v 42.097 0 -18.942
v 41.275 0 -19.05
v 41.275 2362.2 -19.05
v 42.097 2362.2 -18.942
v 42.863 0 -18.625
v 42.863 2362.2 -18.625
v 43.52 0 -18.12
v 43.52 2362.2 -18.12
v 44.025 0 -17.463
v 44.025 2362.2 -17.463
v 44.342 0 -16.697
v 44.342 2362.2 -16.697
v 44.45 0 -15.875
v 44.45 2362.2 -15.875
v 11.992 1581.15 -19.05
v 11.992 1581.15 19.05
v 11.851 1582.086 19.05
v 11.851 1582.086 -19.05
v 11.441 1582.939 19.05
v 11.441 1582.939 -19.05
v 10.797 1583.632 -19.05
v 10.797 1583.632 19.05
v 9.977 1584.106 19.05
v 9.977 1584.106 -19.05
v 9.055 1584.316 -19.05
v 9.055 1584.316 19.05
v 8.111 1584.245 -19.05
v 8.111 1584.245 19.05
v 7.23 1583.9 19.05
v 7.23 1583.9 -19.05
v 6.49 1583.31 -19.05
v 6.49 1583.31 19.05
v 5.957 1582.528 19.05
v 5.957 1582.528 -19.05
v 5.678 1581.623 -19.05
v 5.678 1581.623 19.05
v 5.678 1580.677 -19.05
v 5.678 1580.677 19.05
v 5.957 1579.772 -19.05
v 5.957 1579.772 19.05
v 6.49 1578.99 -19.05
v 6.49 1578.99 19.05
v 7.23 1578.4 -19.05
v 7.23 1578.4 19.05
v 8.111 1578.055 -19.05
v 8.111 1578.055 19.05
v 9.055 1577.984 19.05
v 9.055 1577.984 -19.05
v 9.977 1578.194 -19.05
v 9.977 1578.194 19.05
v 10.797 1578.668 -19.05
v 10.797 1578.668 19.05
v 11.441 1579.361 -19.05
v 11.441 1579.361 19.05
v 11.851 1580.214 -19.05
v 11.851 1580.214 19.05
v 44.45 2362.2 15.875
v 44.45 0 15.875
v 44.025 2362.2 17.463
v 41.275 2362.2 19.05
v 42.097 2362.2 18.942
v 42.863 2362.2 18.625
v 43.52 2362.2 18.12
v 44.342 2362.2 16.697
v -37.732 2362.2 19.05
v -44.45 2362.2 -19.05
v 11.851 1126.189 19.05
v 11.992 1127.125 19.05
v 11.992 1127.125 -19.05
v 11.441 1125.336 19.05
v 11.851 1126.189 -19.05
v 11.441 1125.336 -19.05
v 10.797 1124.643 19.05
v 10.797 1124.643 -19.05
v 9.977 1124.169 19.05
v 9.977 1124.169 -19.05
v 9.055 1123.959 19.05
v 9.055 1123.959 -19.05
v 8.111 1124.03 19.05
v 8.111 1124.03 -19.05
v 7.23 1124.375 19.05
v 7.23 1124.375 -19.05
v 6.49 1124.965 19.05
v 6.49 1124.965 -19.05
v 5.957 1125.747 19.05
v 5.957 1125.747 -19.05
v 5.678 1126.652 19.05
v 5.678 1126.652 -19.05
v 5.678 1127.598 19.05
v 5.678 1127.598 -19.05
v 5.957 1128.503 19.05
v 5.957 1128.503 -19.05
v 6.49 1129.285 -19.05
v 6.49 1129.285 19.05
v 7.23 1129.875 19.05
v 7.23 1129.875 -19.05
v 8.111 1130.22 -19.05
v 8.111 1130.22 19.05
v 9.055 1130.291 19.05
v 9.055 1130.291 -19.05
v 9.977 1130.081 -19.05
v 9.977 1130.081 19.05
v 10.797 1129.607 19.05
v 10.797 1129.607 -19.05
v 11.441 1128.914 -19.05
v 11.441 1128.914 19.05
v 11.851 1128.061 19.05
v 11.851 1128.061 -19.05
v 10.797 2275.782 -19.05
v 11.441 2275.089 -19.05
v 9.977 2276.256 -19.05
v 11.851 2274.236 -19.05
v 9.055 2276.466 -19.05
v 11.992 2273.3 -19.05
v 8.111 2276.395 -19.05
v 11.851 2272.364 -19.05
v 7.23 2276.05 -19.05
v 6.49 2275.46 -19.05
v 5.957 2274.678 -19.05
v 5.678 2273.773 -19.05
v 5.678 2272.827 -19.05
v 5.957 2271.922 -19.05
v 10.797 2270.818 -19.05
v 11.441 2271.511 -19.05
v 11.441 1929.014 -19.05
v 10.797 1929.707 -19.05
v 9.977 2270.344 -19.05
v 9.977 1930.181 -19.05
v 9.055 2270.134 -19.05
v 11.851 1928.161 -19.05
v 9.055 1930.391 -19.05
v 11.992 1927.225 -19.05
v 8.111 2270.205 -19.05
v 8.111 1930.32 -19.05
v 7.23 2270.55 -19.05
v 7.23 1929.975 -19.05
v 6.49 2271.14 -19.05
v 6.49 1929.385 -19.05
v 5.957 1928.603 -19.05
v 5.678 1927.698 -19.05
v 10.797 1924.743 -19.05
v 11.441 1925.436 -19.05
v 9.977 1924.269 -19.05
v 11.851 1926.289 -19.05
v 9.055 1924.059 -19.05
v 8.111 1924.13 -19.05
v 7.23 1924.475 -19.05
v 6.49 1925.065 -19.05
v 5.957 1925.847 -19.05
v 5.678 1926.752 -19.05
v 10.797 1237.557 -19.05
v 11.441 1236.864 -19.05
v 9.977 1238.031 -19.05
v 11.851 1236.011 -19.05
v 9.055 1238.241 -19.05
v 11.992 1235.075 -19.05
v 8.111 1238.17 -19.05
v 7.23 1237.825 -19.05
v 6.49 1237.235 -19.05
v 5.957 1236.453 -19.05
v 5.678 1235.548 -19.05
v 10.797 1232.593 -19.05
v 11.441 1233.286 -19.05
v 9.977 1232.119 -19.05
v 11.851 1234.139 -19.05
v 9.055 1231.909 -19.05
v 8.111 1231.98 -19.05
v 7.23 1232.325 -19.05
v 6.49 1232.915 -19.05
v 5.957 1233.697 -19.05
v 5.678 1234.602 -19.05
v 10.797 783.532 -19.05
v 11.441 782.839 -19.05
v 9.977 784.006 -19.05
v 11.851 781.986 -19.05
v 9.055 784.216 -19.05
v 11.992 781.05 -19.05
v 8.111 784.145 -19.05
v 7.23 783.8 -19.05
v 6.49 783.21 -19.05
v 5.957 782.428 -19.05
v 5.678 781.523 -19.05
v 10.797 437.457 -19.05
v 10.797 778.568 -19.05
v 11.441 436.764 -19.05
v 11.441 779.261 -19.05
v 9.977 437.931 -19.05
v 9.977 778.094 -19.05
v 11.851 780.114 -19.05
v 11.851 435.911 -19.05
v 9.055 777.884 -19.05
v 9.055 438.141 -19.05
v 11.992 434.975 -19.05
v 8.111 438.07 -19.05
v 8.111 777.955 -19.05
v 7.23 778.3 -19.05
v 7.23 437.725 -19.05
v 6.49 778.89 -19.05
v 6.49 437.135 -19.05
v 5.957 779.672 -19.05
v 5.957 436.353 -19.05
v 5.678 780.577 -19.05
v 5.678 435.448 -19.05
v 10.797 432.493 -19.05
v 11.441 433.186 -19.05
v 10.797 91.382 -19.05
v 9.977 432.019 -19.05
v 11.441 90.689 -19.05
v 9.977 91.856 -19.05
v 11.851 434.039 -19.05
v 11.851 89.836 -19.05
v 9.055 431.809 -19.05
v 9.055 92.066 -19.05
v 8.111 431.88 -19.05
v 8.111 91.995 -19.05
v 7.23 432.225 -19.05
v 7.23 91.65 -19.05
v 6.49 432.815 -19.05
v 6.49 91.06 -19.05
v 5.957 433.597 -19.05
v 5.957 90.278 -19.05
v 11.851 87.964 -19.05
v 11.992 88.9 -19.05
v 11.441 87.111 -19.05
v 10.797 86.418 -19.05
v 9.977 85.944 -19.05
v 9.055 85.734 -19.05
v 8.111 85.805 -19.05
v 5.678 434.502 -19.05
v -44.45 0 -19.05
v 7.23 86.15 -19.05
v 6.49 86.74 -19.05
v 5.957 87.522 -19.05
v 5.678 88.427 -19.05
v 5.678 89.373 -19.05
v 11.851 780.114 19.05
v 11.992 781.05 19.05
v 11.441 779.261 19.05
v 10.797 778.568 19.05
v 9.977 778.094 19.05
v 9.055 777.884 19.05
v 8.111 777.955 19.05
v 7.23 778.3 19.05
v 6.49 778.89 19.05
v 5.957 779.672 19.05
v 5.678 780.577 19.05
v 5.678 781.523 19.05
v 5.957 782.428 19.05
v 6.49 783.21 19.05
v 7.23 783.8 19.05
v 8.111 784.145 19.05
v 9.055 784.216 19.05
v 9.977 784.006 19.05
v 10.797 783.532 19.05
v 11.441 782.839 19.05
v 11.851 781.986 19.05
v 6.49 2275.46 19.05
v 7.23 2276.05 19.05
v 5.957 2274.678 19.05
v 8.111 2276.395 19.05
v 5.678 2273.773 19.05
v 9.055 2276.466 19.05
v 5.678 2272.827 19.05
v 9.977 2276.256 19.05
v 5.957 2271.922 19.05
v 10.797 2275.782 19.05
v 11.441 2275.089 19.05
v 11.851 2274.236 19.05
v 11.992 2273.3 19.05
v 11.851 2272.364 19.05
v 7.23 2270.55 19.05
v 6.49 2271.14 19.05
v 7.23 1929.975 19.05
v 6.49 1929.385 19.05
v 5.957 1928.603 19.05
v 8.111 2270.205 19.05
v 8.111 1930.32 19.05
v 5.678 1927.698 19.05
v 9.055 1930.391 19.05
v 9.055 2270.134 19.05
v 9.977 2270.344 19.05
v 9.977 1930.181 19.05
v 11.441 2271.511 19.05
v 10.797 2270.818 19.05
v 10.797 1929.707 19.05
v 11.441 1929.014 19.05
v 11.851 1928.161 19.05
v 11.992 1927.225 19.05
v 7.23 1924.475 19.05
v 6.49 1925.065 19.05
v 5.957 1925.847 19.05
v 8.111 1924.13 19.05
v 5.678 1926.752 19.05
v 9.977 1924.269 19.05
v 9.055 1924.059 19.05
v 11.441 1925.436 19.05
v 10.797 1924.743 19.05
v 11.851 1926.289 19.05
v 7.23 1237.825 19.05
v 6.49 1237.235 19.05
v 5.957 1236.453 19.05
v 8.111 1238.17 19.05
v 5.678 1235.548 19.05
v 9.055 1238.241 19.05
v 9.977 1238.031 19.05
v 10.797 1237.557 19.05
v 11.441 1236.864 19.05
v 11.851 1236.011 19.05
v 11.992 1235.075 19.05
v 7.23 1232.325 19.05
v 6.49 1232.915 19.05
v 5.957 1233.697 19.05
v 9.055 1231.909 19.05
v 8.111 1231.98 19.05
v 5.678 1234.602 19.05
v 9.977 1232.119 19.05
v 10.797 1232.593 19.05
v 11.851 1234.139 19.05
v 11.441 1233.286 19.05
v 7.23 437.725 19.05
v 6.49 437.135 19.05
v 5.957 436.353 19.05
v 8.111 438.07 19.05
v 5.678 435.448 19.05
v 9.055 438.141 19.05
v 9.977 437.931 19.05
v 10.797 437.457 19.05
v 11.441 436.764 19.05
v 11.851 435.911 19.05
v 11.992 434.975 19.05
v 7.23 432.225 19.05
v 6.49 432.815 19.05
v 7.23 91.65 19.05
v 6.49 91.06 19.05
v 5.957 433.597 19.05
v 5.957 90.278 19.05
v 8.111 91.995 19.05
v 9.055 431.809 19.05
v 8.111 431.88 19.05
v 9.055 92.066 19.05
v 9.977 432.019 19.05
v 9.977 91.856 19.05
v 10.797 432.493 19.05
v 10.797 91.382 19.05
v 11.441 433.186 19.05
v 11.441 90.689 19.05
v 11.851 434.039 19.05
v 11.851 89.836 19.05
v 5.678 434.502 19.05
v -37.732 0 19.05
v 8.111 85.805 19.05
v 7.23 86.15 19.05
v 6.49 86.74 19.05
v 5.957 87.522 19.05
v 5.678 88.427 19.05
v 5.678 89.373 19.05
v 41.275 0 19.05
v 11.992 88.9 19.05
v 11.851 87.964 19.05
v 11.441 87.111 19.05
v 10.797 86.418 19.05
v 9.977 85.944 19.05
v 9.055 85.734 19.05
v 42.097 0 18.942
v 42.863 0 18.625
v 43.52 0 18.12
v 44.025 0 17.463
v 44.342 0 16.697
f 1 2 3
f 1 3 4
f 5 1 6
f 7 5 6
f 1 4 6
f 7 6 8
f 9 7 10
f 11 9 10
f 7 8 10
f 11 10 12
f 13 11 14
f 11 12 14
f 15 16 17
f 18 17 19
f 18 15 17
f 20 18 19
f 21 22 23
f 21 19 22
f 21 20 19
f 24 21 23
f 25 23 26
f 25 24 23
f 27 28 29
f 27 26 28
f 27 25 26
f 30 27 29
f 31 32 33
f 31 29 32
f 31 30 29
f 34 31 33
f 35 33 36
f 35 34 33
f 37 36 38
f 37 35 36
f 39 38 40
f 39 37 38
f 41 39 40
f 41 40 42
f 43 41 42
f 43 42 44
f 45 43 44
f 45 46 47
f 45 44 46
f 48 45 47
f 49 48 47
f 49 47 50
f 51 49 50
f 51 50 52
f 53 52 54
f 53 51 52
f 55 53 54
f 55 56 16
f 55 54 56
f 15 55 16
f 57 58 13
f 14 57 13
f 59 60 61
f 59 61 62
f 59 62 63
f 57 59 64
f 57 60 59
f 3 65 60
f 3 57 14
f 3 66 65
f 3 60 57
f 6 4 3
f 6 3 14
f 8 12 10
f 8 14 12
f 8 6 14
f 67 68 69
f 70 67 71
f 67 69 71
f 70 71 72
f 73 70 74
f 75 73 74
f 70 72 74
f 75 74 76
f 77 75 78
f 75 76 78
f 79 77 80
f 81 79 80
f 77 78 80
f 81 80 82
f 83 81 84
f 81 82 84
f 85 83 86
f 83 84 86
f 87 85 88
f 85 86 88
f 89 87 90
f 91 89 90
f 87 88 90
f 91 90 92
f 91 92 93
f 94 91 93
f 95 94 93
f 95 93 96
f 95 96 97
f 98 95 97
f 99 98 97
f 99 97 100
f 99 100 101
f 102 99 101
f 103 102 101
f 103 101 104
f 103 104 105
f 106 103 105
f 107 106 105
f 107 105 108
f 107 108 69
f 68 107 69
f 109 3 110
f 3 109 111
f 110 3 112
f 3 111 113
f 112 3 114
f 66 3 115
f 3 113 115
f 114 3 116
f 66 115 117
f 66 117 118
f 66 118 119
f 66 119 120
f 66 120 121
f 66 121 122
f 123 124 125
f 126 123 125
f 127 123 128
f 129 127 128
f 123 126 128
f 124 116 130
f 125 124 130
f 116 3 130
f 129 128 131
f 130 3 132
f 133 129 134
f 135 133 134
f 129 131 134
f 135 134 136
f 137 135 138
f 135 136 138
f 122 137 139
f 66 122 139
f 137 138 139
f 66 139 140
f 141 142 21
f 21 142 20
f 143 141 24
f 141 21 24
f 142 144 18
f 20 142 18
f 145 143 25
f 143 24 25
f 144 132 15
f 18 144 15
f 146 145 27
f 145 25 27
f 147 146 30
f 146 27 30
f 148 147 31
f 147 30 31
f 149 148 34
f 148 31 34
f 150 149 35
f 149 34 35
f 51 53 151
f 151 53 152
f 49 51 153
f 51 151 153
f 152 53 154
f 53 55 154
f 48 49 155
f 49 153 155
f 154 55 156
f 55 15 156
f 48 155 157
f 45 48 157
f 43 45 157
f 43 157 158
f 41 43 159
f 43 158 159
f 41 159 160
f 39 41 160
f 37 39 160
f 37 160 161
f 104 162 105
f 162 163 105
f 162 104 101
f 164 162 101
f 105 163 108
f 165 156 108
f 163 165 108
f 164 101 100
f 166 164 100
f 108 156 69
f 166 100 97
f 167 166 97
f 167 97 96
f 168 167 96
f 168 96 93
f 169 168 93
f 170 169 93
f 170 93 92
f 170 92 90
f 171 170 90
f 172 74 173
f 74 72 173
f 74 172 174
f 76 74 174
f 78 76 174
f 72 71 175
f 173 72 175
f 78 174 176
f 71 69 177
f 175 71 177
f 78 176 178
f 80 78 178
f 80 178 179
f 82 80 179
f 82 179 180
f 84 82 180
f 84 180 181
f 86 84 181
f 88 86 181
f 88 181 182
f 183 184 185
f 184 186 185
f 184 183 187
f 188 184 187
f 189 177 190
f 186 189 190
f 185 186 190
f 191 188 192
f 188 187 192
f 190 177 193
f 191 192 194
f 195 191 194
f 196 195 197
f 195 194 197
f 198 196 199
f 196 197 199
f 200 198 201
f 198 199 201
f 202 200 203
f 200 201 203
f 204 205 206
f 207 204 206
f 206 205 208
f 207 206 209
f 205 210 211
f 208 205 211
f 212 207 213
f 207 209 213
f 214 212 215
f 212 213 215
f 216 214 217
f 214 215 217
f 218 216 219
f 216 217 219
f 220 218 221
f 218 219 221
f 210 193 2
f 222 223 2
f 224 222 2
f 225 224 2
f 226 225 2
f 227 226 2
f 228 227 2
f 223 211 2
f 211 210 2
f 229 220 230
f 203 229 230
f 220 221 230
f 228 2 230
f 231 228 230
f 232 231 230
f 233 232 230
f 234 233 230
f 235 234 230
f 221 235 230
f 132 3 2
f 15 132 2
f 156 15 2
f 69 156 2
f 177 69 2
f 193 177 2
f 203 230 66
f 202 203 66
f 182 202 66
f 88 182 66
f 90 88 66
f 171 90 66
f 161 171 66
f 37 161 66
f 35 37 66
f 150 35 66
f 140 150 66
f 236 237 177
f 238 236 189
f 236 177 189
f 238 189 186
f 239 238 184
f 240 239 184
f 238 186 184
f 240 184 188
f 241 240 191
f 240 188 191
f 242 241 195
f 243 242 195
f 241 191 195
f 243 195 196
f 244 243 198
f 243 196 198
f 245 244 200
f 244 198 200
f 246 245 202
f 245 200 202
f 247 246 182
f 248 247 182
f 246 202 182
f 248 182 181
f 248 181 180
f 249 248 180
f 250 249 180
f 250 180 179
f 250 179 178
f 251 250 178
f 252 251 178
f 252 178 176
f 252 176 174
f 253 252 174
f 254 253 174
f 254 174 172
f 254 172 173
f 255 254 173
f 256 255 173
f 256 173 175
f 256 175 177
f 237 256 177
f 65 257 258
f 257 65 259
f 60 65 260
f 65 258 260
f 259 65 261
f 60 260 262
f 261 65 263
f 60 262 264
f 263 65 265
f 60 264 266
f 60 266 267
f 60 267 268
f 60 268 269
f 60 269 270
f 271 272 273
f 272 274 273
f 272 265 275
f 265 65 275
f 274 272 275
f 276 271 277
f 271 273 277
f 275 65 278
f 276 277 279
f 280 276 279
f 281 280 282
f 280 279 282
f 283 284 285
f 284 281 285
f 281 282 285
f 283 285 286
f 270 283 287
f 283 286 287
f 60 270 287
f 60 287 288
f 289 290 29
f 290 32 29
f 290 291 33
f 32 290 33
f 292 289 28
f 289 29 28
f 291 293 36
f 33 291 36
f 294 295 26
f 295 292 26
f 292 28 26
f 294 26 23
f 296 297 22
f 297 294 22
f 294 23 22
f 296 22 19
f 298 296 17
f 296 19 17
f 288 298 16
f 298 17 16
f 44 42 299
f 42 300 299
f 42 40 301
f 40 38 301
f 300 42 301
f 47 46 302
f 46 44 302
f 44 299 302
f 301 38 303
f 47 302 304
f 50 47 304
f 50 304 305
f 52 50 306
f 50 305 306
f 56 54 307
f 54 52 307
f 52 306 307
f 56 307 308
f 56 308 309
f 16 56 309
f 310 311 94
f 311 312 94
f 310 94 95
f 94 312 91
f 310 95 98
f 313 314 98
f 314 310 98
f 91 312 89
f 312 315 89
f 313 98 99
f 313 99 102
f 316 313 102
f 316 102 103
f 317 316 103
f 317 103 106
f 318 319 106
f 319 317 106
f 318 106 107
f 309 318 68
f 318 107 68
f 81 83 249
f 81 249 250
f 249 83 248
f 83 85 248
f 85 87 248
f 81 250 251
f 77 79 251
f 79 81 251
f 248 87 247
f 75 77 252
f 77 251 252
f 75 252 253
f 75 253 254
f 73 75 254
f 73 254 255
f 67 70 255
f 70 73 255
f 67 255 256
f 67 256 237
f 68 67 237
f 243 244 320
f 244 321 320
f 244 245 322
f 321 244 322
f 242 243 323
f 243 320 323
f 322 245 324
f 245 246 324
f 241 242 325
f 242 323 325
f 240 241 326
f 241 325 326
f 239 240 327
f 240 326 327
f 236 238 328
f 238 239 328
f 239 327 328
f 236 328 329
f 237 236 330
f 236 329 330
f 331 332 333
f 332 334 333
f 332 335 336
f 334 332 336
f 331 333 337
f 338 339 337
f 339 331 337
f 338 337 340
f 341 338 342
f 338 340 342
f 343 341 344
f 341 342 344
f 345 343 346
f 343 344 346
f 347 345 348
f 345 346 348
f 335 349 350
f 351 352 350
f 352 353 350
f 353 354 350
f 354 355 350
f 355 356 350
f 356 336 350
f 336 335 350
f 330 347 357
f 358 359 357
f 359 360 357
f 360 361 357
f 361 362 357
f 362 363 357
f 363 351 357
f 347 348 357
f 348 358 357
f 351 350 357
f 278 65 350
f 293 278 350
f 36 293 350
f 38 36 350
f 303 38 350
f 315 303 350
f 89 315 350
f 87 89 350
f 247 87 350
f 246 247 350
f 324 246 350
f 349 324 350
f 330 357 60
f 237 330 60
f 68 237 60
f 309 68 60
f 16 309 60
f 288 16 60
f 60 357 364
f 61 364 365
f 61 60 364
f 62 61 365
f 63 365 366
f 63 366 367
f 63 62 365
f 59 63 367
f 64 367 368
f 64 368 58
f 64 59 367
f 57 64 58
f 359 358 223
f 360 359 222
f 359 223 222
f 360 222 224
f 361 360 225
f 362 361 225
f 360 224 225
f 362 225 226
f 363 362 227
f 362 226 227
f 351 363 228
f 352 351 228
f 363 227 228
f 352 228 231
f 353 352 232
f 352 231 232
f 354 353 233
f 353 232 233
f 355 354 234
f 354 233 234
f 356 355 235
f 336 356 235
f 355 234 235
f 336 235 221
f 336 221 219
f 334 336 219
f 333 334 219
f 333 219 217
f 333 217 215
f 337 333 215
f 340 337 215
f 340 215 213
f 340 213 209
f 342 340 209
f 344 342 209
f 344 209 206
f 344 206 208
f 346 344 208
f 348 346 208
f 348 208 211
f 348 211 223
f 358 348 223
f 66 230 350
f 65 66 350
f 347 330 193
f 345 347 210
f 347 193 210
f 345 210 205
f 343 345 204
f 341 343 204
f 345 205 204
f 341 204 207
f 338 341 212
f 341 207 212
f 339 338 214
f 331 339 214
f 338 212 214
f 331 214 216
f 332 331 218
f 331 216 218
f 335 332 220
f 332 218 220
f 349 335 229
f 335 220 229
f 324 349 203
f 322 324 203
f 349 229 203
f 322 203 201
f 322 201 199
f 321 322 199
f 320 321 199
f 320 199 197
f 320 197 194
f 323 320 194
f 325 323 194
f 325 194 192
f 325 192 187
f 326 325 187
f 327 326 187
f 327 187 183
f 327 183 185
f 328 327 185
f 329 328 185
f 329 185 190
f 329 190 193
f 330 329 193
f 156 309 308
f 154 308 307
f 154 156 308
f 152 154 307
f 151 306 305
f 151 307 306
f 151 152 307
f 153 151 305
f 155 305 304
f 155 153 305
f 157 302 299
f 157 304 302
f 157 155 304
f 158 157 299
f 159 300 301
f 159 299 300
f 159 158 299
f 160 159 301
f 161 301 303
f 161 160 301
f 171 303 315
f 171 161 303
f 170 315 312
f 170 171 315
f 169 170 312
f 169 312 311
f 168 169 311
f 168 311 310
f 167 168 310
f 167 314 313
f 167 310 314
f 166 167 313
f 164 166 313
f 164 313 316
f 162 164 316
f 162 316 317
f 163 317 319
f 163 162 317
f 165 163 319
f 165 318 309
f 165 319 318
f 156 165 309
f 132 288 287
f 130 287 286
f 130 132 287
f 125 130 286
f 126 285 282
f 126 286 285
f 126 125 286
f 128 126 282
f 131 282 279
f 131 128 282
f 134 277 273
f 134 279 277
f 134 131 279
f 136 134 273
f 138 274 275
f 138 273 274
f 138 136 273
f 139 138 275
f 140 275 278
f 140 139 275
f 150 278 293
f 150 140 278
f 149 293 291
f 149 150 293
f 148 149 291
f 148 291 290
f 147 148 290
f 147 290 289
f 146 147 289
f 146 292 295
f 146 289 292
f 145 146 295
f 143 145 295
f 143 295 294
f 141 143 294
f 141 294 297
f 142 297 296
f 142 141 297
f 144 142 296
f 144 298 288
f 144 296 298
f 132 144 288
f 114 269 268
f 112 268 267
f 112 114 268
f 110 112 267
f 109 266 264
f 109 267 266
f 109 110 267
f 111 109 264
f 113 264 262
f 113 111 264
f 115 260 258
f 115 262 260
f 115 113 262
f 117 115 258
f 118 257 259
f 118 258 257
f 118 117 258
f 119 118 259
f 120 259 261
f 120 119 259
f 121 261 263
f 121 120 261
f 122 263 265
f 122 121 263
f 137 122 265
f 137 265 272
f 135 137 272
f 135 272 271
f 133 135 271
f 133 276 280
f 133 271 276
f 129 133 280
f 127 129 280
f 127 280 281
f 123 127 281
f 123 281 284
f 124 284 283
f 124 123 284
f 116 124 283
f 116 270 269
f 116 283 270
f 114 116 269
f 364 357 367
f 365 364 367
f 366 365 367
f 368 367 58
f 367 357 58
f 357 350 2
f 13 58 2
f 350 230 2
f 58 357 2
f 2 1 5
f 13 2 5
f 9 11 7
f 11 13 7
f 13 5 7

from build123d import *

# Parameters (mm, degrees)
BOSS_EXTRUDE1_DEPTH         = 2362.2
F_1_4_0_25_DIAMETER_HOLE1_D = 6.35
FILLET2_R                   = 3.175


with BuildPart() as part:
    # Sketch1 → Boss-Extrude1 (new body)
    with BuildSketch(Plane(origin=(0, 0, 0), x_dir=(1, 0, 0), z_dir=(0, 1, 0))):
        Polygon((-44.45, 19.05), (-37.731942035, -19.05), (44.45, -19.05), (44.45, 19.05), align=None)
    extrude(amount=BOSS_EXTRUDE1_DEPTH)

    # 1/4 (0.25) Diameter Hole1 (through all)
    with Locations(Plane(origin=(0, 0, 19.05), x_dir=(-1, 0, 0), z_dir=(0, 0, 1))):
        with Locations((-8.817444165, -88.9), (-8.817444165, -434.975), (-8.817444165, -781.05), (-8.817444165, -1127.125)):
            f_1_4_0_25_diameter_hole1 = Hole(F_1_4_0_25_DIAMETER_HOLE1_D / 2)

    # Fillet2
    fillet2_edges = [part.edges().sort_by_distance(p)[0] for p in [
        (44.45, 1181.1, 19.05),
        (44.45, 1181.1, -19.05),
    ]]
    fillet(fillet2_edges, radius=FILLET2_R)

    # Mirror1: 1/4 (0.25) Diameter Hole1 across plane
    add(f_1_4_0_25_diameter_hole1.mirror(Plane(origin=(0, 1181.1, 0), x_dir=(0, 0, 1), z_dir=(0, -1, 0))), mode=Mode.SUBTRACT)


solid = part.part
